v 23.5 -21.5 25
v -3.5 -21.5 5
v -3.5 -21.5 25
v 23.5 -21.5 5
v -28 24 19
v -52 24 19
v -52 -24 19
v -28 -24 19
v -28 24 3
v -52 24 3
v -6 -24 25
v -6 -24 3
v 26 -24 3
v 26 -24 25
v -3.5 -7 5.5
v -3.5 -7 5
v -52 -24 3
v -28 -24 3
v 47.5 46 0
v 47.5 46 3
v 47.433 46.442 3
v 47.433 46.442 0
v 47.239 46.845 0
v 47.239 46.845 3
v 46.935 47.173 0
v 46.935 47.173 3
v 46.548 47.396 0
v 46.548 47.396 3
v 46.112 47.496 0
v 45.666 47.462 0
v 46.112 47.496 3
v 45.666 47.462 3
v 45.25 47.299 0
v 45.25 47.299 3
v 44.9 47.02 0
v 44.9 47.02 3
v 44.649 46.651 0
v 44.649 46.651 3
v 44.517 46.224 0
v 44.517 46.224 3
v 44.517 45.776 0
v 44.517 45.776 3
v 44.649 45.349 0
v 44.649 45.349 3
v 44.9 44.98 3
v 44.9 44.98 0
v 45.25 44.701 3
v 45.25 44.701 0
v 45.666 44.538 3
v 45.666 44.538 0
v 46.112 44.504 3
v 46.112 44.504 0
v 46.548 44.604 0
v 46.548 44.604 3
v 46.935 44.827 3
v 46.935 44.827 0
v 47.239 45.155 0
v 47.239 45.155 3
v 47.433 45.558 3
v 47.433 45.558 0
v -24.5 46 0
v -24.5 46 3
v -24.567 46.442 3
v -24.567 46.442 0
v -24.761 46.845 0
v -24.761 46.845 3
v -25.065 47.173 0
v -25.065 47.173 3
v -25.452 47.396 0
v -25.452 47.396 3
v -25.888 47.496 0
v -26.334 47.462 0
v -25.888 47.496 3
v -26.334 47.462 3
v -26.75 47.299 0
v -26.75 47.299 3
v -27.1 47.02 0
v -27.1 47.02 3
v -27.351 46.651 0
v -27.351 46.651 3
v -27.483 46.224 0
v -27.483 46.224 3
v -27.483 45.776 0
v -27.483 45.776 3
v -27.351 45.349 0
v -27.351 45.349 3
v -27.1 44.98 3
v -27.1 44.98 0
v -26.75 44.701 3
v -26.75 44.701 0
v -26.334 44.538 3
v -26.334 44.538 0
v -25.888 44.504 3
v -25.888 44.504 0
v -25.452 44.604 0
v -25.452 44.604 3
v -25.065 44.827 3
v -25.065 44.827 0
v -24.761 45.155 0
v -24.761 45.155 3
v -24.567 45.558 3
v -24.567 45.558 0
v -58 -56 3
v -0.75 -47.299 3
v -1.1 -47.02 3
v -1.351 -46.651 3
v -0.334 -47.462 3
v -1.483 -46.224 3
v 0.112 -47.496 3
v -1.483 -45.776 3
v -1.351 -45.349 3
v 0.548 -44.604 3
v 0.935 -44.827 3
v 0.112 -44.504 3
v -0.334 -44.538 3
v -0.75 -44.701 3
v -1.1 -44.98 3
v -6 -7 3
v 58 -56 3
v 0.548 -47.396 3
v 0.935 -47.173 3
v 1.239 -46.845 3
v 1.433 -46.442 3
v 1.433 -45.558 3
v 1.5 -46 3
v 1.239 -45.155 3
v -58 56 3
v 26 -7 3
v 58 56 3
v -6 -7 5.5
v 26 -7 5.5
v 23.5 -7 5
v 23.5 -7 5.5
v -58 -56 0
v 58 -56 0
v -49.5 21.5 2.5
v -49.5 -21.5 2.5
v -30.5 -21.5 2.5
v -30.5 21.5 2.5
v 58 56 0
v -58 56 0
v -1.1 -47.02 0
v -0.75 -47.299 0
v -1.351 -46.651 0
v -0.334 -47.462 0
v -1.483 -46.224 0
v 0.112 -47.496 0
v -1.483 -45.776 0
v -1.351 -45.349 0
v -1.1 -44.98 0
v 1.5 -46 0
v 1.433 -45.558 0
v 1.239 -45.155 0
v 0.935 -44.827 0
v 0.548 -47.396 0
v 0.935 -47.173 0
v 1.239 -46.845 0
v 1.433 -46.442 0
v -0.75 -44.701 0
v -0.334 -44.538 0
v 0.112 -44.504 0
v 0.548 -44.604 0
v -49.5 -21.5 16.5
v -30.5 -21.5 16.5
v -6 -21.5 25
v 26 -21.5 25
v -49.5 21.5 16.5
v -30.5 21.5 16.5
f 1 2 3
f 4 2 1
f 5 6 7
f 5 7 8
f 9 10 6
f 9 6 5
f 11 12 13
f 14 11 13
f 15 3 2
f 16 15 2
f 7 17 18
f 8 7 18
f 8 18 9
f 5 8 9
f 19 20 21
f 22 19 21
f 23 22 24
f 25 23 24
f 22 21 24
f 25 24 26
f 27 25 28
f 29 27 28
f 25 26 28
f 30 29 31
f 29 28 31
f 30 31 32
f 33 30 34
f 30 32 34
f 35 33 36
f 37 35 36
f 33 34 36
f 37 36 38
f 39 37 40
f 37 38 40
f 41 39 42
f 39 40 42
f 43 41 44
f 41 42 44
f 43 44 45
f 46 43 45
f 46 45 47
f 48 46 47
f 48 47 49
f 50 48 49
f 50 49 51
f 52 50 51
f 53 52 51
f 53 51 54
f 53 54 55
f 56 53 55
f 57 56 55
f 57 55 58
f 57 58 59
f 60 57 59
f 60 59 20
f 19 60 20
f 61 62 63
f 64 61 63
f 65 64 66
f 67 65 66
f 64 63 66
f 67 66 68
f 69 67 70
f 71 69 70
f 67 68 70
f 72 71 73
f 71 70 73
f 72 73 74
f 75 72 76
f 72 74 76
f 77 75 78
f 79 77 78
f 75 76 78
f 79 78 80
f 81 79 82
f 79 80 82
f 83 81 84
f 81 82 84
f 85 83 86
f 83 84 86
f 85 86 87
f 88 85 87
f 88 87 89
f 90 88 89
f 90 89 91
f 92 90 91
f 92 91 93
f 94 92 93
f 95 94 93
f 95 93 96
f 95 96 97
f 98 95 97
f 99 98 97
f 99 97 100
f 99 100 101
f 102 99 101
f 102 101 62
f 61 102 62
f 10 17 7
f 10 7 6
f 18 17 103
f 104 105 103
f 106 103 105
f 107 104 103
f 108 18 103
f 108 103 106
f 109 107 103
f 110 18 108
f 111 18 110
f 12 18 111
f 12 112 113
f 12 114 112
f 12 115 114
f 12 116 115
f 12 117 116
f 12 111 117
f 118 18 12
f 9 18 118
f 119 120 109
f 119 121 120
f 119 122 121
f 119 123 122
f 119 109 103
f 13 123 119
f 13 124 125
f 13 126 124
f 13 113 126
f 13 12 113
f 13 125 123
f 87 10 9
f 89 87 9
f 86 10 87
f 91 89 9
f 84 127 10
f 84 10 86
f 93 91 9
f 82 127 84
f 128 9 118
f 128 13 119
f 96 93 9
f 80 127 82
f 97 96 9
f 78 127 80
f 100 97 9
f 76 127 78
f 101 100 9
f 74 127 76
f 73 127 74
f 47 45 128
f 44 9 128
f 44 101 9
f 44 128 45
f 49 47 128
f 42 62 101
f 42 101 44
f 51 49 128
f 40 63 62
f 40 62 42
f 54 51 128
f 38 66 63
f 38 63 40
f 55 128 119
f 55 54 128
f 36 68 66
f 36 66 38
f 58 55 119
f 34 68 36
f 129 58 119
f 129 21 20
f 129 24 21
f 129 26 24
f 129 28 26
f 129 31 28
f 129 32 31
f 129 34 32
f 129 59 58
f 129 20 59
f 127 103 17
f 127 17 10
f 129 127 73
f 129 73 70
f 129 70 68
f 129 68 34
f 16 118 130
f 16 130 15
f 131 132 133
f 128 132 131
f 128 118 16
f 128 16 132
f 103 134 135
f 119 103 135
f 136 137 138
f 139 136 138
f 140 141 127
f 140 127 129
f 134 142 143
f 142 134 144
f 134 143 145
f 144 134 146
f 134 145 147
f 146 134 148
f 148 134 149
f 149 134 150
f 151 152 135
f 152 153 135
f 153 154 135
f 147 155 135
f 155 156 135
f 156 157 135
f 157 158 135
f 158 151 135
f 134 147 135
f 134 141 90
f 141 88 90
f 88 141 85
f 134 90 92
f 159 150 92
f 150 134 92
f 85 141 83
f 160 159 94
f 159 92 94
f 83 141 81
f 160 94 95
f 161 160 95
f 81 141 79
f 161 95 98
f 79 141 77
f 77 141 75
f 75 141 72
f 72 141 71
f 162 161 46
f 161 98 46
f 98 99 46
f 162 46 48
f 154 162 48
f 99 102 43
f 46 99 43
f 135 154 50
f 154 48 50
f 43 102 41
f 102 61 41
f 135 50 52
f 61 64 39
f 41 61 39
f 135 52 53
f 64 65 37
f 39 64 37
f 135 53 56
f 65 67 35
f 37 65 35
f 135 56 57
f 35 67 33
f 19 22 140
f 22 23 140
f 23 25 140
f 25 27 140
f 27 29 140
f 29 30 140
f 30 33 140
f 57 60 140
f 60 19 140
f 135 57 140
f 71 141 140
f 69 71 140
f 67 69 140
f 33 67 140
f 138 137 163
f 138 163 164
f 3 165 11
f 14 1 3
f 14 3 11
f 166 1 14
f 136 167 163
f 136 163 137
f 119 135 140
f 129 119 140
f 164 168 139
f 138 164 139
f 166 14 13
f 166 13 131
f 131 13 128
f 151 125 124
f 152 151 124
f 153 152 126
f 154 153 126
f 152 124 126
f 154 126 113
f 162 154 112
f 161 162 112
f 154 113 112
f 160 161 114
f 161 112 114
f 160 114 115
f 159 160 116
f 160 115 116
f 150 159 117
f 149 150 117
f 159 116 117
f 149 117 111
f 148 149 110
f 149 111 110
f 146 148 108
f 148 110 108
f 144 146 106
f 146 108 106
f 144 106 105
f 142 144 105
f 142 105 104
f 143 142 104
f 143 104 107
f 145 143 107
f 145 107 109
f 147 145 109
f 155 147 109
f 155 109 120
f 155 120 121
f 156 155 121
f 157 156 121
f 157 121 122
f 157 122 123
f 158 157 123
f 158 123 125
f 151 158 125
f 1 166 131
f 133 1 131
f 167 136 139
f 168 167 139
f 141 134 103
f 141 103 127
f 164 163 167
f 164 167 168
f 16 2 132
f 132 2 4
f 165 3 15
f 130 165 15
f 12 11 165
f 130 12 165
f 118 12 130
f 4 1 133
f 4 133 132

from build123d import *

# Parameters (mm, degrees)
CROQUIS1_W              = 116
CROQUIS1_H              = 112
SALIENTE_EXTRUIR1_DEPTH = 3
CROQUIS2_W              = 24
CROQUIS2_H              = 48
SALIENTE_EXTRUIR2_DEPTH = 16
CROQUIS3_W              = 32
CROQUIS3_H              = 17
SALIENTE_EXTRUIR3_DEPTH = 22
VACIADO1_START          = -21.5
VACIADO1_OUTLINE_W      = 27
VACIADO1_OUTLINE_H      = 22.5
VACIADO1_OUTLINE_W_2    = 19
VACIADO1_OUTLINE_H_2    = 14
VACIADO1_DEPTH          = 14.5
VACIADO1_START_2        = -7
VACIADO1_2_OUTLINE_W    = 19
VACIADO1_2_OUTLINE_H    = 14
VACIADO1_2_DEPTH        = 28.5
CROQUIS5_W              = 27
CROQUIS5_H              = 2.5
SALIENTE_EXTRUIR7_DEPTH = 14.5
CORTAR_EXTRUIR1_DEPTH   = 34.5
CROQUIS7_R              = 1.5
CORTAR_EXTRUIR2_DEPTH   = 34.5


# Read off the part's stored shape, not the designer's step: Vaciado1
with BuildPart() as part:
    # Croquis1 → Saliente-Extruir1 (new body)
    with BuildSketch(Plane.XY):
        Rectangle(CROQUIS1_W, CROQUIS1_H)
    extrude(amount=SALIENTE_EXTRUIR1_DEPTH)

    # Croquis2 → Saliente-Extruir2 (add)
    with BuildSketch(Plane.XY.offset(3)):
        with Locations((-40, 0)):
            Rectangle(CROQUIS2_W, CROQUIS2_H)
    extrude(amount=SALIENTE_EXTRUIR2_DEPTH)

    # Croquis3 → Saliente-Extruir3 (add)
    with BuildSketch(Plane.XY.offset(3)):
        with Locations((10, -15.5)):
            Rectangle(CROQUIS3_W, CROQUIS3_H)
    extrude(amount=SALIENTE_EXTRUIR3_DEPTH)

    # Vaciado1 outline → Vaciado1 (cut)
    with BuildSketch(Plane(origin=(0, 0, 0), x_dir=(1, 0, 0), z_dir=(0, 1, 0)).offset(VACIADO1_START)):
        with Locations((10, -13.75)):
            Rectangle(VACIADO1_OUTLINE_W, VACIADO1_OUTLINE_H)
        with Locations((-40, -9.5)):
            Rectangle(VACIADO1_OUTLINE_W_2, VACIADO1_OUTLINE_H_2)
    extrude(amount=VACIADO1_DEPTH, mode=Mode.SUBTRACT)

    # Vaciado1 2 outline → Vaciado1 2 (cut)
    with BuildSketch(Plane(origin=(0, 0, 0), x_dir=(1, 0, 0), z_dir=(0, 1, 0)).offset(VACIADO1_START_2)):
        with Locations((-40, -9.5)):
            Rectangle(VACIADO1_2_OUTLINE_W, VACIADO1_2_OUTLINE_H)
    extrude(amount=VACIADO1_2_DEPTH, mode=Mode.SUBTRACT)

    # Croquis5 → Saliente-Extruir7 (add)
    with BuildSketch(Plane(origin=(0, -21.5, 0), x_dir=(1, 0, 0), z_dir=(0, 1, 0))):
        with Locations((10, -3.75)):
            Rectangle(CROQUIS5_W, CROQUIS5_H)
    extrude(amount=SALIENTE_EXTRUIR7_DEPTH)

    # Croquis6 → Cortar-Extruir1 (cut)
    with BuildSketch(Plane(origin=(26, 0, 0), x_dir=(0, 0, -1), z_dir=(1, 0, 0))):
        Polygon((-25, -7), (-25, -21.5), (-5.5, -7), align=None)
    extrude(amount=-CORTAR_EXTRUIR1_DEPTH, mode=Mode.SUBTRACT)

    # Croquis7 → Cortar-Extruir2 (cut)
    with BuildSketch(Plane.XY.offset(3)):
        with Locations((-26, 46)):
            Circle(CROQUIS7_R)
        with Locations((46, 46)):
            Circle(CROQUIS7_R)
        with Locations((0, -46)):
            Circle(CROQUIS7_R)
    extrude(amount=-CORTAR_EXTRUIR2_DEPTH, mode=Mode.SUBTRACT)


solid = part.part
